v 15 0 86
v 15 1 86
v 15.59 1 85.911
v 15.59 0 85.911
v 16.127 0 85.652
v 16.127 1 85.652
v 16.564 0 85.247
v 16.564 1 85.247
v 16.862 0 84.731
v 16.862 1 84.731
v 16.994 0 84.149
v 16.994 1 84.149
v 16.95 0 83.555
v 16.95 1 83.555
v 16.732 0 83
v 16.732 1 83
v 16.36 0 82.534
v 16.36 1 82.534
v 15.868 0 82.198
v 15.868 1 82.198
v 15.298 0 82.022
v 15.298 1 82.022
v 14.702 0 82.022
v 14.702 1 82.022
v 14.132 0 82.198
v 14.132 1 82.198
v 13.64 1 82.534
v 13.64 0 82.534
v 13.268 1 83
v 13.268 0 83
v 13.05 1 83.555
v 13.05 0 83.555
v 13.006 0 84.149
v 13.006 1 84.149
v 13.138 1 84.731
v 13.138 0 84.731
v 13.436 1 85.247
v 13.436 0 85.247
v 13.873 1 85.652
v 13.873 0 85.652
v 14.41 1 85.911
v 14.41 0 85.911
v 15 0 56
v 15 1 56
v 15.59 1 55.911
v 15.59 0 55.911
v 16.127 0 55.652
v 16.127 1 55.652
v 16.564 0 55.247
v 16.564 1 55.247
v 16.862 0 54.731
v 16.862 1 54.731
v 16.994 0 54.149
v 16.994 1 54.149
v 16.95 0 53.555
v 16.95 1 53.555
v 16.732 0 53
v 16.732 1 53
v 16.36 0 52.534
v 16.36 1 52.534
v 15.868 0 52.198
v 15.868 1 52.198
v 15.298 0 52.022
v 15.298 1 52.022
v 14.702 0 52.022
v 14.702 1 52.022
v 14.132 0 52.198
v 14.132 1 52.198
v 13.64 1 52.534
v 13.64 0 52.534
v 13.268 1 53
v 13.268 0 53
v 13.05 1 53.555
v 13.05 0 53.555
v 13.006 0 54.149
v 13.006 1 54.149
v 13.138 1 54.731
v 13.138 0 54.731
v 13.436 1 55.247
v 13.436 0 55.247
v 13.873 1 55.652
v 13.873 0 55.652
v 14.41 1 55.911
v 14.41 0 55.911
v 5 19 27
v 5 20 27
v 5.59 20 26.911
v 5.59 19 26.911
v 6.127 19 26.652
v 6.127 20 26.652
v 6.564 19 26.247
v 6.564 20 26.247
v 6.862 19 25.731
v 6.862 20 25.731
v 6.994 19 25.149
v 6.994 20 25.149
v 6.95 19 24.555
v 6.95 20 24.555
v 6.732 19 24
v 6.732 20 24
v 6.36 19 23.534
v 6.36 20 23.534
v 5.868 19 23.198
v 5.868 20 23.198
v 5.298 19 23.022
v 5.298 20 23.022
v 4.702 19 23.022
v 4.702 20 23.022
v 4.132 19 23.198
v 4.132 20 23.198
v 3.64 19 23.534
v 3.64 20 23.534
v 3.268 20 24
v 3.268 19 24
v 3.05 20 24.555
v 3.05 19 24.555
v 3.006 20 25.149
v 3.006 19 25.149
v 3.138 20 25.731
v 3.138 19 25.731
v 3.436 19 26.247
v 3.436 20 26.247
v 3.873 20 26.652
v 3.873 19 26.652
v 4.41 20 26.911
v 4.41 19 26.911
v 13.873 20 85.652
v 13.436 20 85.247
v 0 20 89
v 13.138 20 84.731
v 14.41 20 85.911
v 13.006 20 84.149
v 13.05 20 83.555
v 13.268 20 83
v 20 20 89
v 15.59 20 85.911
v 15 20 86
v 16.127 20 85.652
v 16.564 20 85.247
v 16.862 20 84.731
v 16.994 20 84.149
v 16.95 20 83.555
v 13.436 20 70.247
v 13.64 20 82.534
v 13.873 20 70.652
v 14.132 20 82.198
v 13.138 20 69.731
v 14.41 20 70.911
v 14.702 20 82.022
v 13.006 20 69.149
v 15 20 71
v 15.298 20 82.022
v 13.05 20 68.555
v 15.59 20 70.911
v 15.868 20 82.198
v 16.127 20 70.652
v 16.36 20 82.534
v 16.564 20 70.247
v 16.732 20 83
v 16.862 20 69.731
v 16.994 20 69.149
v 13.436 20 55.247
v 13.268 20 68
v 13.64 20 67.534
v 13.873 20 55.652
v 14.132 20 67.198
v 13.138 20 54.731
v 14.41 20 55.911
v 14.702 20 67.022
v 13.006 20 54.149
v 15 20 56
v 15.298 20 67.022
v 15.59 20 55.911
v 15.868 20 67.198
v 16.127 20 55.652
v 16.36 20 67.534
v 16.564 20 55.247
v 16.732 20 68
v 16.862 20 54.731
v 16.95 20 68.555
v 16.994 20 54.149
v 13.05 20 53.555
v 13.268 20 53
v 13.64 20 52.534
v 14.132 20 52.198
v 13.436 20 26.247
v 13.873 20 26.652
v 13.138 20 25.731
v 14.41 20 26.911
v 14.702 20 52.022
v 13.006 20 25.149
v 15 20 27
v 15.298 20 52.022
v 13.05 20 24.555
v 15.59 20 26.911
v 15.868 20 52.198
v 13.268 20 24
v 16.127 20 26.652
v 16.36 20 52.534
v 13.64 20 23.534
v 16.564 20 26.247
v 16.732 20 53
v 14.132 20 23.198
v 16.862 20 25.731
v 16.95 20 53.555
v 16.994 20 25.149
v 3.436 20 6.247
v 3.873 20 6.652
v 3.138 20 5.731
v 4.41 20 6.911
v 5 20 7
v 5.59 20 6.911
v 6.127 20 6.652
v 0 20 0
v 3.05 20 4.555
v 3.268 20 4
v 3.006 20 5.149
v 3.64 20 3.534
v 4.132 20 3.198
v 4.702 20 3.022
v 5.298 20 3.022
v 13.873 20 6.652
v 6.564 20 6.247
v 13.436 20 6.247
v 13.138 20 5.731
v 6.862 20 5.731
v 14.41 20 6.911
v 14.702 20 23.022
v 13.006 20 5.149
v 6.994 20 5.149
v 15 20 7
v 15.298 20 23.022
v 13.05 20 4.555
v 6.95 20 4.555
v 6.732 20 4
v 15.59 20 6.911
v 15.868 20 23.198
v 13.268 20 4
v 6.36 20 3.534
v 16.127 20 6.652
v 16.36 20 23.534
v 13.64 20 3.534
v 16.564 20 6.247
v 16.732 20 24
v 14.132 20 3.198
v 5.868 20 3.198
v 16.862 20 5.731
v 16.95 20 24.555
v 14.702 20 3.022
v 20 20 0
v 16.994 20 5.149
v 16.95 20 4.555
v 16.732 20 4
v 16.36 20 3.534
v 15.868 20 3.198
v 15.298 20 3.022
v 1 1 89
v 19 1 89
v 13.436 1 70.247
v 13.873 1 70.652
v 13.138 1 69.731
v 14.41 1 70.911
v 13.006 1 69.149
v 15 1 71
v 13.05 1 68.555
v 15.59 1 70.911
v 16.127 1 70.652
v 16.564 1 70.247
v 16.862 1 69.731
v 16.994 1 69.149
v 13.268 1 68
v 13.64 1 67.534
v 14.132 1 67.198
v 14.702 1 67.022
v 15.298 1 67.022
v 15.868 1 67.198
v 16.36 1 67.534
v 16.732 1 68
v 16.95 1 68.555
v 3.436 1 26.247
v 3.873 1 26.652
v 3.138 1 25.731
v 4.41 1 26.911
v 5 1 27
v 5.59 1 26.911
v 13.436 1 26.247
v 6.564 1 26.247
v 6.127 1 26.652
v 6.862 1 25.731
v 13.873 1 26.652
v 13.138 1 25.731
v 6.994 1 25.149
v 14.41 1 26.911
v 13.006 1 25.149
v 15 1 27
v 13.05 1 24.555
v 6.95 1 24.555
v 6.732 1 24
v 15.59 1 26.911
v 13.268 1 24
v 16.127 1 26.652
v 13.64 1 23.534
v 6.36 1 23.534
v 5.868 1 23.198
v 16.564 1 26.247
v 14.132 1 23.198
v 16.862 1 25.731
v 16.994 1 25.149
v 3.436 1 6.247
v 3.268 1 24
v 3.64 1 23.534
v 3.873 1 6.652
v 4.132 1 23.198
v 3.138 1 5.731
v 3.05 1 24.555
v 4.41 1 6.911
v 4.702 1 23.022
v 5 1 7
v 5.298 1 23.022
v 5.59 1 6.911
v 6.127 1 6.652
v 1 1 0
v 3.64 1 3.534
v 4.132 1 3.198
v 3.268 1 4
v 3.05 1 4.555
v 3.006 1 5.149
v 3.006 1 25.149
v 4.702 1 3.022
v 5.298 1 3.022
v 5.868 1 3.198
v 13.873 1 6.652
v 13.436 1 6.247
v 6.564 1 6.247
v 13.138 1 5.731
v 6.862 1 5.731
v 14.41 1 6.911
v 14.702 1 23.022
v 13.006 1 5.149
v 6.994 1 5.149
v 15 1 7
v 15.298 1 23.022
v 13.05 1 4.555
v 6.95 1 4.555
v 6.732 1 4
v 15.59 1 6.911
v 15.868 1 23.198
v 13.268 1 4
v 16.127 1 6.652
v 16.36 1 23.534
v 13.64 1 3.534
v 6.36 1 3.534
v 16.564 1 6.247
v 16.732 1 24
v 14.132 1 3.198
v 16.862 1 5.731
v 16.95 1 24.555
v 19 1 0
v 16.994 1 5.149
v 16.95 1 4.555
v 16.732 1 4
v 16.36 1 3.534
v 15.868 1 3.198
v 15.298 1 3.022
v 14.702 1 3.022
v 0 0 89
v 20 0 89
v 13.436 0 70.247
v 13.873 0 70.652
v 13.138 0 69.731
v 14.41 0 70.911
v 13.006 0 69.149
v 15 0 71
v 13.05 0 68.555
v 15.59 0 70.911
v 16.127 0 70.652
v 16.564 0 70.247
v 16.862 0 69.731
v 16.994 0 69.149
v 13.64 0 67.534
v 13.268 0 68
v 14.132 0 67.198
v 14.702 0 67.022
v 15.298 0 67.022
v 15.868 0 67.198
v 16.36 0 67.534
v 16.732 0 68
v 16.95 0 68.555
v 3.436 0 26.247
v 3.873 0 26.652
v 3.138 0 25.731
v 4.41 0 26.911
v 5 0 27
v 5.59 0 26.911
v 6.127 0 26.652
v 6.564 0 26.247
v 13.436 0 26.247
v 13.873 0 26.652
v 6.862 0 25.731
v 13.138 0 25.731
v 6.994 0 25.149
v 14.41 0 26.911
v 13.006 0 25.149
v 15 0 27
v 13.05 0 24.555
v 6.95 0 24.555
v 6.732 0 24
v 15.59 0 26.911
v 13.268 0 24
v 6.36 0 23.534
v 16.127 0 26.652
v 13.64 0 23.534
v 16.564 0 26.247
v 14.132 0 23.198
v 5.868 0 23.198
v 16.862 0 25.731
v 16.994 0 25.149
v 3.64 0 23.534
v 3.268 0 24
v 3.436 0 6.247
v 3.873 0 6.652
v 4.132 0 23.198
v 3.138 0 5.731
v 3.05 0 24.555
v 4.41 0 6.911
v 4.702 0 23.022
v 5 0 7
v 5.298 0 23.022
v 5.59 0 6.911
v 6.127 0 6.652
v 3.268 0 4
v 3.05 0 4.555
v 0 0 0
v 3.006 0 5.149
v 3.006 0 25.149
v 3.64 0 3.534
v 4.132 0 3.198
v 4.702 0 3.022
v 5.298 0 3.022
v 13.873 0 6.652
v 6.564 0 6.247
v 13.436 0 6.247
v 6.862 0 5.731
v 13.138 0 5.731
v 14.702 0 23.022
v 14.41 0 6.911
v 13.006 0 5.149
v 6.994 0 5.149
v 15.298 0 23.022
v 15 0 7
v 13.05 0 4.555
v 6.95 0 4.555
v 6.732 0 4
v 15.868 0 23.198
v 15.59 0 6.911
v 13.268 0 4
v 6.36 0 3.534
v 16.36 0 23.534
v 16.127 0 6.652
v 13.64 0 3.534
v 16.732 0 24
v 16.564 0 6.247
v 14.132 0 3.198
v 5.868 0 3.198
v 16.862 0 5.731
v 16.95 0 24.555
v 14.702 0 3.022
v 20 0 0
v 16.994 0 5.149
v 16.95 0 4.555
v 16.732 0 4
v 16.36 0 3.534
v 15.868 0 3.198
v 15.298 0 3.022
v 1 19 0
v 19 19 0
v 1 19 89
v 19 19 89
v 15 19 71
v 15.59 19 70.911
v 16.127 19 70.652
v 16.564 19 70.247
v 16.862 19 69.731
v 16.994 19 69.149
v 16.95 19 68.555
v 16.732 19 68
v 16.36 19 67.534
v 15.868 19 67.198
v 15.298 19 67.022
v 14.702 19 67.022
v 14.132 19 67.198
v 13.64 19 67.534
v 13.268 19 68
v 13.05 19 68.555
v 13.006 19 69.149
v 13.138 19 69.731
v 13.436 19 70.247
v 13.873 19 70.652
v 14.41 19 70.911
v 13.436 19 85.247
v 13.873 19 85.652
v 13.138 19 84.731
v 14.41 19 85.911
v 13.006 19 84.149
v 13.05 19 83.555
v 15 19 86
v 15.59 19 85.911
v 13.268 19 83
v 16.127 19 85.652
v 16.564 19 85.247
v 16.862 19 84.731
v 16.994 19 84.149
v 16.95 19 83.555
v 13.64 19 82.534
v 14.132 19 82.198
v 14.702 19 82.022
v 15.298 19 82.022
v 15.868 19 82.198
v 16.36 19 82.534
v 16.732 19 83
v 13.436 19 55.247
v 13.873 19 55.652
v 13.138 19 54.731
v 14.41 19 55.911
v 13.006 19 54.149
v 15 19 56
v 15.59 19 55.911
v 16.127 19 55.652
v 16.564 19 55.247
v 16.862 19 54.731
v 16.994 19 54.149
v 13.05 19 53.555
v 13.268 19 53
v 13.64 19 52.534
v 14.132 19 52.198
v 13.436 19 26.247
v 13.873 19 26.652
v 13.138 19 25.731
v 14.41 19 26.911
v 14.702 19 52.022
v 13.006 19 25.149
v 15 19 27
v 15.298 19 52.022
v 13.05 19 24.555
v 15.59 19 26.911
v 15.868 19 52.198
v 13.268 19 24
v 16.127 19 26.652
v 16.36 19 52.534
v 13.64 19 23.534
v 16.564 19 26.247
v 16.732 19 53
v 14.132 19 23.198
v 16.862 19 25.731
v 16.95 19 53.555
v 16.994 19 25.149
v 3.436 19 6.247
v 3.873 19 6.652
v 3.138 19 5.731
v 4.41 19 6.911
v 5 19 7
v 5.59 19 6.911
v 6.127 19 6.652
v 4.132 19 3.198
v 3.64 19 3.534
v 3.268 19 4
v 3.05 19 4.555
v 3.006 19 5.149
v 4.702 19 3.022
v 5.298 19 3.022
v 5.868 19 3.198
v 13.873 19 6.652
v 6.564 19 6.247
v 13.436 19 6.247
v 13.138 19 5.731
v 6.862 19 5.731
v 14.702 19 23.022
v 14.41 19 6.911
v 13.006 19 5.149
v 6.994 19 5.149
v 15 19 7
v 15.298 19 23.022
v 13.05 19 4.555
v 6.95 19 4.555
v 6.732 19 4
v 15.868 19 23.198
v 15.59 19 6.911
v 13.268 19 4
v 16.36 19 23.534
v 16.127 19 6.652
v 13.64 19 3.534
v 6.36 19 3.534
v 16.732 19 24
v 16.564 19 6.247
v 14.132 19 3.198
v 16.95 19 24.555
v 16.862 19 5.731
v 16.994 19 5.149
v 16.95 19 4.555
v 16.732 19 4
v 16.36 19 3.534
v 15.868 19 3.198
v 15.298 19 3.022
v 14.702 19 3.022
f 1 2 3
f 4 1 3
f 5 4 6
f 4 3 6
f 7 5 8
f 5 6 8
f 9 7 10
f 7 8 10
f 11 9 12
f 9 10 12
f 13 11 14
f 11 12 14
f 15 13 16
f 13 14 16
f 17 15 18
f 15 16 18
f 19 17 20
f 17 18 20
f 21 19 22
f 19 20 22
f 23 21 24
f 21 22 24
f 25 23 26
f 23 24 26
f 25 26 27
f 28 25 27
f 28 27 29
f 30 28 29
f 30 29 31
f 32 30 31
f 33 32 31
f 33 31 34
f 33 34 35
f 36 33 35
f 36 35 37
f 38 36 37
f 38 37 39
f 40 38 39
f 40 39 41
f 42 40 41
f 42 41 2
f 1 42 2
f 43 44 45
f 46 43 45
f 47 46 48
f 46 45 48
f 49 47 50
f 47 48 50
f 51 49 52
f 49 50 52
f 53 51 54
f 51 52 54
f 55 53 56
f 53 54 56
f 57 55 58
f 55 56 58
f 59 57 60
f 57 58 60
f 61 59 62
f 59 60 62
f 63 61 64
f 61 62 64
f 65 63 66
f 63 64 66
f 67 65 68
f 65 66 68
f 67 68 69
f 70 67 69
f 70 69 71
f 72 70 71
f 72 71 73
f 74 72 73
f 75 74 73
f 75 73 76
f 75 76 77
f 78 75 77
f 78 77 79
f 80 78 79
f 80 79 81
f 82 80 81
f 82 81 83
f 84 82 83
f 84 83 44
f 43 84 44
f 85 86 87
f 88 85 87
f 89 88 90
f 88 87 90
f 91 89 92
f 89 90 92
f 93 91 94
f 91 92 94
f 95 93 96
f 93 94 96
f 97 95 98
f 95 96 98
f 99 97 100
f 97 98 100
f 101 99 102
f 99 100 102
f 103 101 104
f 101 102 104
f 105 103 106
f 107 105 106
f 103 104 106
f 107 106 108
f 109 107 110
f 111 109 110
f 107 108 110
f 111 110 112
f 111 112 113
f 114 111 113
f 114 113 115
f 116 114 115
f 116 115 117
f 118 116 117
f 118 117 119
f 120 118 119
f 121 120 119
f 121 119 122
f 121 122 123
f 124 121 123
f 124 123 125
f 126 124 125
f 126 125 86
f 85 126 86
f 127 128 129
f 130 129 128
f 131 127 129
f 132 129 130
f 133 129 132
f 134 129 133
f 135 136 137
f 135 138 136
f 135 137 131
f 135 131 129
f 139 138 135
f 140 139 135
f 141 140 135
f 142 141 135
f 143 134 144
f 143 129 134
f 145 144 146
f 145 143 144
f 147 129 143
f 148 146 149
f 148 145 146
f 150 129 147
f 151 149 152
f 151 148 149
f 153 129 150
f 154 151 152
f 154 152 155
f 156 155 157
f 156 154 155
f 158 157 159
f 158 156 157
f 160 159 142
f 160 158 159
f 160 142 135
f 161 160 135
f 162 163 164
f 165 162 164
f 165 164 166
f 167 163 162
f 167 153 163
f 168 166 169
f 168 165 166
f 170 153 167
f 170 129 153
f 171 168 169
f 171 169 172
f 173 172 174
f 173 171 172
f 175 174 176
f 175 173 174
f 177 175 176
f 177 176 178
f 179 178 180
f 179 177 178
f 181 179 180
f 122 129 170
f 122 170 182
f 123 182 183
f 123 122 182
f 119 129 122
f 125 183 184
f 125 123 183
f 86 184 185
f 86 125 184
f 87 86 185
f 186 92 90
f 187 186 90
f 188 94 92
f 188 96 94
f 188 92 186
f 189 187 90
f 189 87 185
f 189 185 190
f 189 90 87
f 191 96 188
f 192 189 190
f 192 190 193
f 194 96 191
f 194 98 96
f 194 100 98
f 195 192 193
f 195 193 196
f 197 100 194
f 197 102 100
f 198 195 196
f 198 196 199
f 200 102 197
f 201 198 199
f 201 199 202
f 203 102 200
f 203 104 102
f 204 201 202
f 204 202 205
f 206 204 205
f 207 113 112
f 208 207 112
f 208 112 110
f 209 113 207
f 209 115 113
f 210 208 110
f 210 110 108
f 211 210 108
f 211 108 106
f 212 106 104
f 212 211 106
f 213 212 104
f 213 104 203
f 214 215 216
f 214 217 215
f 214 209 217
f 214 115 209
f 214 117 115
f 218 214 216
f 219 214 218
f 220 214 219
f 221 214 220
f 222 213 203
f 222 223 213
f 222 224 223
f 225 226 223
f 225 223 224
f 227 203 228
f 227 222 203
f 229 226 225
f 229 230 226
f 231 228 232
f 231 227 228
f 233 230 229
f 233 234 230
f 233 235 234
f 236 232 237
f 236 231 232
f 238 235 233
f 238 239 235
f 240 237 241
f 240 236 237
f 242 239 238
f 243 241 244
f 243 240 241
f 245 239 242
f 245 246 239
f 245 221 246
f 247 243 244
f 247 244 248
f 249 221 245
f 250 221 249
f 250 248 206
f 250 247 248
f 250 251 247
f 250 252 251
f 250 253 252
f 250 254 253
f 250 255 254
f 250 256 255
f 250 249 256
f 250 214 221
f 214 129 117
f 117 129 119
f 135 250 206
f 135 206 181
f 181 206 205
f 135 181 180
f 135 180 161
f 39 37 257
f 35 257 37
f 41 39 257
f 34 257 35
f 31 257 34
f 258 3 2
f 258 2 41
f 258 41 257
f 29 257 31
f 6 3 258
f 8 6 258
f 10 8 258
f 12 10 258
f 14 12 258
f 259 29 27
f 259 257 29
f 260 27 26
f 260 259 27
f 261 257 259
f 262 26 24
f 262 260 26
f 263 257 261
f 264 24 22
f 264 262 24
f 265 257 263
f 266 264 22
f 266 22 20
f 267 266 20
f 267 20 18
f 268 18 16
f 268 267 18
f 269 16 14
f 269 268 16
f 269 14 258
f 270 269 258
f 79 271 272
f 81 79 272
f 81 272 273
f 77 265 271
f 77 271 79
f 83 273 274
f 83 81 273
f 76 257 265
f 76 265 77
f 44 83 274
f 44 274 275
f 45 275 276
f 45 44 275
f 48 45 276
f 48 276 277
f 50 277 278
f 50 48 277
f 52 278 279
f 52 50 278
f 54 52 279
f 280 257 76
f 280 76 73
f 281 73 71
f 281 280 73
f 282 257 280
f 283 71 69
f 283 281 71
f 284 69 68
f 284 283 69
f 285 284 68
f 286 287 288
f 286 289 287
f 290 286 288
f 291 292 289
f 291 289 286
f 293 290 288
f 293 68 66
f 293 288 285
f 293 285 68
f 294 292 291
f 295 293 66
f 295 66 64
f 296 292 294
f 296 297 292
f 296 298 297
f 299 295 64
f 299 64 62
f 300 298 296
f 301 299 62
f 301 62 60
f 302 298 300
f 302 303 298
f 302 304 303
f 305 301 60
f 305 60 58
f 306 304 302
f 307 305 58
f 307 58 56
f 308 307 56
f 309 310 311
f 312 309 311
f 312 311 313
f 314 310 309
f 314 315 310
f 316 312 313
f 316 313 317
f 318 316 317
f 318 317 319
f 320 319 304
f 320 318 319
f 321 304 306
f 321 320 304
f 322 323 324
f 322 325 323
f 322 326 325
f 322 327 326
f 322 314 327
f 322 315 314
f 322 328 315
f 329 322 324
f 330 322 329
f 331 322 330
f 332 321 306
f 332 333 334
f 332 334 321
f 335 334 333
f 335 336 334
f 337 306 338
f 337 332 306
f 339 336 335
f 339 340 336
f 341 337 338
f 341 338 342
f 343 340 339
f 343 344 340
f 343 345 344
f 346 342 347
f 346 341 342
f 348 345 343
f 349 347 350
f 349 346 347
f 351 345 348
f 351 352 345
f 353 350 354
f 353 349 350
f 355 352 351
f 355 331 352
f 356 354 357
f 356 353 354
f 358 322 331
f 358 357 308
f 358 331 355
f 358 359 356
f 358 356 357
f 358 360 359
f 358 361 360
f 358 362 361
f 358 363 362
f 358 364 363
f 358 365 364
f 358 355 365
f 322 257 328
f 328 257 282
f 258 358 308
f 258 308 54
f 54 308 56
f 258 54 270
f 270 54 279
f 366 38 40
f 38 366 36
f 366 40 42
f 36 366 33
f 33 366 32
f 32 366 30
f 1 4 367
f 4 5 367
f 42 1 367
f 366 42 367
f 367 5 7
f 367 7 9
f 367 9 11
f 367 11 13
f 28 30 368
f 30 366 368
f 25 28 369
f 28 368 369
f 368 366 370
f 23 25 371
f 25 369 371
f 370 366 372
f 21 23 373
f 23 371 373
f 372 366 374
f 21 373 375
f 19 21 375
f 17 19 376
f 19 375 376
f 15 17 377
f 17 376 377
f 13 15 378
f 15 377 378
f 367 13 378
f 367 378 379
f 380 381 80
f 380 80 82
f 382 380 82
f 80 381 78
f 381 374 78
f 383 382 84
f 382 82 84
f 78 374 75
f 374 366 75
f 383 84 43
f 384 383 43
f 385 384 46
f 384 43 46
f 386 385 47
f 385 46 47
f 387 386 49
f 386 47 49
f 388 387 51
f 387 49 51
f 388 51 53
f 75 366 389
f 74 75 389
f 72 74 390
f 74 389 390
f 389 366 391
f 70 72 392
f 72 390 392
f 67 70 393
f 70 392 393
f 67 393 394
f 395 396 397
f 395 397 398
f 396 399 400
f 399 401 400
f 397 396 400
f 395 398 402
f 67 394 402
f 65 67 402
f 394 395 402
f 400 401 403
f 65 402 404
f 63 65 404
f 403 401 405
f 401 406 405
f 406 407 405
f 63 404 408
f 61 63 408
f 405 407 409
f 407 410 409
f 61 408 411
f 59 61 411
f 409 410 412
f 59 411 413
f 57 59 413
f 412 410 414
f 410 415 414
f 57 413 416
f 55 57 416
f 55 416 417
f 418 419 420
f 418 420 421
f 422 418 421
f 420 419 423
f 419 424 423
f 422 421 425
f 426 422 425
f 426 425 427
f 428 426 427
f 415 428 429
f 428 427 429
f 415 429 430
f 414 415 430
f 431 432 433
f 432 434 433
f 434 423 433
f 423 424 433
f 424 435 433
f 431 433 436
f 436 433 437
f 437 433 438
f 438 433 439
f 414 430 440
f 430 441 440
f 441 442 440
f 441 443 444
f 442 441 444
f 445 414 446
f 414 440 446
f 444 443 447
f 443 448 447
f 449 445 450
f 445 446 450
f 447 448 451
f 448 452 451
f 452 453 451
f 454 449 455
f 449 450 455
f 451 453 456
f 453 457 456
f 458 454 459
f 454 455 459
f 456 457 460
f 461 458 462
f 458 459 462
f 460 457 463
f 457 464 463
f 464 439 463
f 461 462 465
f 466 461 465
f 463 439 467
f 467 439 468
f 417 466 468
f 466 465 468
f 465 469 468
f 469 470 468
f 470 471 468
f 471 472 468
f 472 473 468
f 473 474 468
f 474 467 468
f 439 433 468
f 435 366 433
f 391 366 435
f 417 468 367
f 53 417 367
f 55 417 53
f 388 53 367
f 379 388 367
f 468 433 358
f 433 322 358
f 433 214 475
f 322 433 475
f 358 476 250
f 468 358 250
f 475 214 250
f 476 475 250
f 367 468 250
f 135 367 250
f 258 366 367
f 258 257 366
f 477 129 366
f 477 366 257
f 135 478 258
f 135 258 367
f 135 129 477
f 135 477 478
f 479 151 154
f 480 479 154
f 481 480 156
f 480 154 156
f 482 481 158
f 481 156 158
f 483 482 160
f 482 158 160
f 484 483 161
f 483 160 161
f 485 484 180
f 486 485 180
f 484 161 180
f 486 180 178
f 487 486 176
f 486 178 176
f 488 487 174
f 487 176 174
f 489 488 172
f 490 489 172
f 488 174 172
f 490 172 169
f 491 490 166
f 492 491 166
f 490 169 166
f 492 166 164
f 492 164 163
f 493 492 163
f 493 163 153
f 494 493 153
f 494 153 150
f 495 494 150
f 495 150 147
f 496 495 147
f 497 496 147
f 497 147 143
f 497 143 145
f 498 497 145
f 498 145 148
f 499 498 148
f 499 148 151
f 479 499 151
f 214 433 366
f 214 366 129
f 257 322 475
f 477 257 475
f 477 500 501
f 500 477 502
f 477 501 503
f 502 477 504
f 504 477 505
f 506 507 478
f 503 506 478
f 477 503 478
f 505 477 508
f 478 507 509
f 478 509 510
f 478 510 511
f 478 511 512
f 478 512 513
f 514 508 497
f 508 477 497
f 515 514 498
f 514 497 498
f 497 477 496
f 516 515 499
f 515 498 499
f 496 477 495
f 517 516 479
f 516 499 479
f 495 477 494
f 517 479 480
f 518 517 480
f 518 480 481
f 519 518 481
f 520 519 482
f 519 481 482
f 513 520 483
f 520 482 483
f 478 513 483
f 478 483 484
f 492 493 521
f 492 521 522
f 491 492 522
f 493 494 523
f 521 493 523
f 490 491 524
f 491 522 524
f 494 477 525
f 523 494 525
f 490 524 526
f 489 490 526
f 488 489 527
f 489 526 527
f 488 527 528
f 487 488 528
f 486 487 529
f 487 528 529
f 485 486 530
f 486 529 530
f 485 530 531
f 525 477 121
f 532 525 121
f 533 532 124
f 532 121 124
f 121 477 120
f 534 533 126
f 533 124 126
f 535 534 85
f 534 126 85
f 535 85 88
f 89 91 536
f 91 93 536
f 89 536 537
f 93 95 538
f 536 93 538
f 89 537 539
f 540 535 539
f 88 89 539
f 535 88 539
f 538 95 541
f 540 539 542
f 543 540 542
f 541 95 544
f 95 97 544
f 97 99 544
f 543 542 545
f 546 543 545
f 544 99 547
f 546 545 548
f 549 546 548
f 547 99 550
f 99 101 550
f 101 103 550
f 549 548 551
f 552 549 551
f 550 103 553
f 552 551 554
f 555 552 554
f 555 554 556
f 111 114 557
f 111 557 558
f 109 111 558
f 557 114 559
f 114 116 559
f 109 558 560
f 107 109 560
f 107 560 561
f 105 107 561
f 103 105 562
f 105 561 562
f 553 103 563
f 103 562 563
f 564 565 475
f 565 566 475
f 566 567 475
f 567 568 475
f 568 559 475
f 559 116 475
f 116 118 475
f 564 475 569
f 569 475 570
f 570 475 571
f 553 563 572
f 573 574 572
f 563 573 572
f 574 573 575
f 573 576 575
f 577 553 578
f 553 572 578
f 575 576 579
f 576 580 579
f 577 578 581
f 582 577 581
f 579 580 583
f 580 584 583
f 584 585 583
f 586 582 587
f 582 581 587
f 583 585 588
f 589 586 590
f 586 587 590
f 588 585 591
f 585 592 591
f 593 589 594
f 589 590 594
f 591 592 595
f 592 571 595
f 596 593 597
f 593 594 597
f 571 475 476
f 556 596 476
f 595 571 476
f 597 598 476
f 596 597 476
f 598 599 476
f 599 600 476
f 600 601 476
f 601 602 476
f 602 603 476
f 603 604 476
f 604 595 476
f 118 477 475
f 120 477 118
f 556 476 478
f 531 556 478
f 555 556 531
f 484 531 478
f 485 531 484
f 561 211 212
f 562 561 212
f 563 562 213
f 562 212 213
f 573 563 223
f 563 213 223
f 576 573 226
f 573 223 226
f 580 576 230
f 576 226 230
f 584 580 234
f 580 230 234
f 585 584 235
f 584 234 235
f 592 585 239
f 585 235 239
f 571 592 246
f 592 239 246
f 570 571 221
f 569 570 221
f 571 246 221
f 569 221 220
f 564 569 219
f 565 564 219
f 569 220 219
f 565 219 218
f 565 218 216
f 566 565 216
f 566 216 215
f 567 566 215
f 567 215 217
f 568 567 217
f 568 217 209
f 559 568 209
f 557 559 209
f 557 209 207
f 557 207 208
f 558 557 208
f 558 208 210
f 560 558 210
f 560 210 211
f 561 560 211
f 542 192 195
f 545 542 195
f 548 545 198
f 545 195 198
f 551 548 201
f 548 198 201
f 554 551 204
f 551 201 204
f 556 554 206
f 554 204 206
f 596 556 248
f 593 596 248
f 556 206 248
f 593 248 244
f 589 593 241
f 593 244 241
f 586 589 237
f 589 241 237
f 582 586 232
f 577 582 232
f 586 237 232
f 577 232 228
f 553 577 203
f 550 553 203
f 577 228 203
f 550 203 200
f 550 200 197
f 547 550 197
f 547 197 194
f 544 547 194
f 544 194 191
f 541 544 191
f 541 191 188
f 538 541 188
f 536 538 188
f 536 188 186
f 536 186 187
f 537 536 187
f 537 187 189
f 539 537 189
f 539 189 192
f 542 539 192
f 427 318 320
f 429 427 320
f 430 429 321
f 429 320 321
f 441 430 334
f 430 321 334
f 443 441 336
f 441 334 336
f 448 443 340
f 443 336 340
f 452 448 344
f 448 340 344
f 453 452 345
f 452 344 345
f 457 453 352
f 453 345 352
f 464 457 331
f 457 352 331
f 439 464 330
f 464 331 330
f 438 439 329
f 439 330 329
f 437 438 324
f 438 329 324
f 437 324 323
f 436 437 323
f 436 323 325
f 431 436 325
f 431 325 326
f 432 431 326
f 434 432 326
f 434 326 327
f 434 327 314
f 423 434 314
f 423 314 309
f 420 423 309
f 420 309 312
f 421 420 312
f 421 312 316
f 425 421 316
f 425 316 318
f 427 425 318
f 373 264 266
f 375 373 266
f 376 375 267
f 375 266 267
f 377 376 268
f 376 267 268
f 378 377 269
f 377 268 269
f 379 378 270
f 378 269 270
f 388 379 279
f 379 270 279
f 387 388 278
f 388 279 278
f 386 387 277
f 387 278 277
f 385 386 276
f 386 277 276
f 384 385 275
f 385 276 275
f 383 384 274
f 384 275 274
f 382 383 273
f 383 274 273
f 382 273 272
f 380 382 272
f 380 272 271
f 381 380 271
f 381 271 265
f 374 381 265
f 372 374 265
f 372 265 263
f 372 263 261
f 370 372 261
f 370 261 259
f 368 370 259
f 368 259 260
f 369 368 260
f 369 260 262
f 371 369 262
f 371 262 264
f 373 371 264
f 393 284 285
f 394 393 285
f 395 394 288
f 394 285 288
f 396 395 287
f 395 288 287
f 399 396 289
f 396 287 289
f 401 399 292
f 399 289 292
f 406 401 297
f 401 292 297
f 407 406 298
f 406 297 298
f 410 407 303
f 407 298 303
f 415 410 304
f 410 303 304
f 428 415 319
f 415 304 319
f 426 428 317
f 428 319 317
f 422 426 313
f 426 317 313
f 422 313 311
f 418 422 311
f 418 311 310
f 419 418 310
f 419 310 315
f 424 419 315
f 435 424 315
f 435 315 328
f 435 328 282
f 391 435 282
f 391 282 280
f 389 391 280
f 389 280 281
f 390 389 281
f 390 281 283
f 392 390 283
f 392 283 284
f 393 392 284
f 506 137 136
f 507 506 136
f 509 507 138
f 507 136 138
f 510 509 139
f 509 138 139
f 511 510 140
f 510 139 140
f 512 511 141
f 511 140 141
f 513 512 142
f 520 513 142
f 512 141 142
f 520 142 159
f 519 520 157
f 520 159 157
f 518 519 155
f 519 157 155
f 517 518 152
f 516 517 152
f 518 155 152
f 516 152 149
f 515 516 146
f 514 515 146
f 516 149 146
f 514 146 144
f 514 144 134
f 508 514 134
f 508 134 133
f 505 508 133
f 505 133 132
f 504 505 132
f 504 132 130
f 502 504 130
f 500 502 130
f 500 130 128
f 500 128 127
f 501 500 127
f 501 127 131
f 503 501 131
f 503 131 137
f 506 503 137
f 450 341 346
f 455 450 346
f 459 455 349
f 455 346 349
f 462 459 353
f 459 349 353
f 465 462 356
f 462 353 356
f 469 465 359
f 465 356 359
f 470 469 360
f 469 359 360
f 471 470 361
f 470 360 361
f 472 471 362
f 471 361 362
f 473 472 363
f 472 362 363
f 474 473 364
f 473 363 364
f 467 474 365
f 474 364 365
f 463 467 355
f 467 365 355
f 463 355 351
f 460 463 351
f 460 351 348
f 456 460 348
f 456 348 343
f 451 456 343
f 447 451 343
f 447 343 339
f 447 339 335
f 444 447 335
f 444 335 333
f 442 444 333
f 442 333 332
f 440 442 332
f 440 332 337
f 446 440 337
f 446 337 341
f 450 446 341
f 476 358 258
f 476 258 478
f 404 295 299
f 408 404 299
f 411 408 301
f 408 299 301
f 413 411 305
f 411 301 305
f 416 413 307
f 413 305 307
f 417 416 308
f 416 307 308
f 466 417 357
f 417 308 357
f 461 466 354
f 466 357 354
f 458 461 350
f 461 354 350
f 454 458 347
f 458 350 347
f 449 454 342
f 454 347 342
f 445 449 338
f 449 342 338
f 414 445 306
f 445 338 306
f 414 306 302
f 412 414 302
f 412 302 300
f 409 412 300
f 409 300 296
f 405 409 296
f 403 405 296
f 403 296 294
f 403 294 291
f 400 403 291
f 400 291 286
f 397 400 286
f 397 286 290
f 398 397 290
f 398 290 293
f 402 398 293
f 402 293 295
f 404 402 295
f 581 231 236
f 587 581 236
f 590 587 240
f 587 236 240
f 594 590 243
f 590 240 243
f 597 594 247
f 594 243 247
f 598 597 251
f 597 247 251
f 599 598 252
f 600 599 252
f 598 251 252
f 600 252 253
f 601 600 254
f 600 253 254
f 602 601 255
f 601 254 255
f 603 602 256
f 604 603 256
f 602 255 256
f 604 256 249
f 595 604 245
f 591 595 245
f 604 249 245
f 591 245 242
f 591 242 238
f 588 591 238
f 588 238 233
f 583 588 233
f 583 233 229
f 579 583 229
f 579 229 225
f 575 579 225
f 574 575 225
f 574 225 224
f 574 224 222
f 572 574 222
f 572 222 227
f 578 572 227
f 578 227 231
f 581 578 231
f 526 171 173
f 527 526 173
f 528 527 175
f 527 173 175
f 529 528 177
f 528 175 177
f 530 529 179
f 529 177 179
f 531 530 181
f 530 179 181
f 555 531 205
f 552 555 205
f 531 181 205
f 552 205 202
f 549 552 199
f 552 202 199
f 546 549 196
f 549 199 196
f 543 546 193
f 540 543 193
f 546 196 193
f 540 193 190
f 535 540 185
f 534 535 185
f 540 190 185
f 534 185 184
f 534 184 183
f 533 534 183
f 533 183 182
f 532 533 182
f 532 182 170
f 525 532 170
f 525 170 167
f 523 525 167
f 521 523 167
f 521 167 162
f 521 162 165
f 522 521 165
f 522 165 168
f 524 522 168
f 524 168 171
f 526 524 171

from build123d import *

# Parameters (mm, degrees)
SKETCH_1_W          = 20
SKETCH_1_H          = 20
SKETCH_1_W_2        = 18
SKETCH_1_H_2        = 18
EXTRUDE_1_DEPTH     = 89
SKETCH_2_R          = 2
CUT_EXTRUDE_1_DEPTH = 94.386294498


with BuildPart() as part:
    # 草图1 → 拉伸-薄壁1 (new body)
    with BuildSketch(Plane.XY):
        with Locations((10, 10)):
            Rectangle(SKETCH_1_W, SKETCH_1_H)
        with Locations((10, 10)):
            Rectangle(SKETCH_1_W_2, SKETCH_1_H_2, mode=Mode.SUBTRACT)
    extrude(amount=EXTRUDE_1_DEPTH)

    # 草图2 → 切除-拉伸1 (cut, through all)
    with BuildSketch(Plane(origin=(0, 20, 0), x_dir=(1, 0, 0), z_dir=(0, 1, 0))):
        with Locations(Location((5, -5, 0), (0, 0, 270))):
            Circle(SKETCH_2_R)
        with Locations(Location((15, -5, 0), (0, 0, 270))):
            Circle(SKETCH_2_R)
        with Locations(Location((5, -25, 0), (0, 0, 270))):
            Circle(SKETCH_2_R)
        with Locations(Location((15, -25, 0), (0, 0, 270))):
            Circle(SKETCH_2_R)
        with Locations(Location((15, -84, 0), (0, 0, 270))):
            Circle(SKETCH_2_R)
        with Locations(Location((15, -69, 0), (0, 0, 270))):
            Circle(SKETCH_2_R)
        with Locations(Location((15, -54, 0), (0, 0, 270))):
            Circle(SKETCH_2_R)
    extrude(amount=-CUT_EXTRUDE_1_DEPTH, mode=Mode.SUBTRACT)


solid = part.part
